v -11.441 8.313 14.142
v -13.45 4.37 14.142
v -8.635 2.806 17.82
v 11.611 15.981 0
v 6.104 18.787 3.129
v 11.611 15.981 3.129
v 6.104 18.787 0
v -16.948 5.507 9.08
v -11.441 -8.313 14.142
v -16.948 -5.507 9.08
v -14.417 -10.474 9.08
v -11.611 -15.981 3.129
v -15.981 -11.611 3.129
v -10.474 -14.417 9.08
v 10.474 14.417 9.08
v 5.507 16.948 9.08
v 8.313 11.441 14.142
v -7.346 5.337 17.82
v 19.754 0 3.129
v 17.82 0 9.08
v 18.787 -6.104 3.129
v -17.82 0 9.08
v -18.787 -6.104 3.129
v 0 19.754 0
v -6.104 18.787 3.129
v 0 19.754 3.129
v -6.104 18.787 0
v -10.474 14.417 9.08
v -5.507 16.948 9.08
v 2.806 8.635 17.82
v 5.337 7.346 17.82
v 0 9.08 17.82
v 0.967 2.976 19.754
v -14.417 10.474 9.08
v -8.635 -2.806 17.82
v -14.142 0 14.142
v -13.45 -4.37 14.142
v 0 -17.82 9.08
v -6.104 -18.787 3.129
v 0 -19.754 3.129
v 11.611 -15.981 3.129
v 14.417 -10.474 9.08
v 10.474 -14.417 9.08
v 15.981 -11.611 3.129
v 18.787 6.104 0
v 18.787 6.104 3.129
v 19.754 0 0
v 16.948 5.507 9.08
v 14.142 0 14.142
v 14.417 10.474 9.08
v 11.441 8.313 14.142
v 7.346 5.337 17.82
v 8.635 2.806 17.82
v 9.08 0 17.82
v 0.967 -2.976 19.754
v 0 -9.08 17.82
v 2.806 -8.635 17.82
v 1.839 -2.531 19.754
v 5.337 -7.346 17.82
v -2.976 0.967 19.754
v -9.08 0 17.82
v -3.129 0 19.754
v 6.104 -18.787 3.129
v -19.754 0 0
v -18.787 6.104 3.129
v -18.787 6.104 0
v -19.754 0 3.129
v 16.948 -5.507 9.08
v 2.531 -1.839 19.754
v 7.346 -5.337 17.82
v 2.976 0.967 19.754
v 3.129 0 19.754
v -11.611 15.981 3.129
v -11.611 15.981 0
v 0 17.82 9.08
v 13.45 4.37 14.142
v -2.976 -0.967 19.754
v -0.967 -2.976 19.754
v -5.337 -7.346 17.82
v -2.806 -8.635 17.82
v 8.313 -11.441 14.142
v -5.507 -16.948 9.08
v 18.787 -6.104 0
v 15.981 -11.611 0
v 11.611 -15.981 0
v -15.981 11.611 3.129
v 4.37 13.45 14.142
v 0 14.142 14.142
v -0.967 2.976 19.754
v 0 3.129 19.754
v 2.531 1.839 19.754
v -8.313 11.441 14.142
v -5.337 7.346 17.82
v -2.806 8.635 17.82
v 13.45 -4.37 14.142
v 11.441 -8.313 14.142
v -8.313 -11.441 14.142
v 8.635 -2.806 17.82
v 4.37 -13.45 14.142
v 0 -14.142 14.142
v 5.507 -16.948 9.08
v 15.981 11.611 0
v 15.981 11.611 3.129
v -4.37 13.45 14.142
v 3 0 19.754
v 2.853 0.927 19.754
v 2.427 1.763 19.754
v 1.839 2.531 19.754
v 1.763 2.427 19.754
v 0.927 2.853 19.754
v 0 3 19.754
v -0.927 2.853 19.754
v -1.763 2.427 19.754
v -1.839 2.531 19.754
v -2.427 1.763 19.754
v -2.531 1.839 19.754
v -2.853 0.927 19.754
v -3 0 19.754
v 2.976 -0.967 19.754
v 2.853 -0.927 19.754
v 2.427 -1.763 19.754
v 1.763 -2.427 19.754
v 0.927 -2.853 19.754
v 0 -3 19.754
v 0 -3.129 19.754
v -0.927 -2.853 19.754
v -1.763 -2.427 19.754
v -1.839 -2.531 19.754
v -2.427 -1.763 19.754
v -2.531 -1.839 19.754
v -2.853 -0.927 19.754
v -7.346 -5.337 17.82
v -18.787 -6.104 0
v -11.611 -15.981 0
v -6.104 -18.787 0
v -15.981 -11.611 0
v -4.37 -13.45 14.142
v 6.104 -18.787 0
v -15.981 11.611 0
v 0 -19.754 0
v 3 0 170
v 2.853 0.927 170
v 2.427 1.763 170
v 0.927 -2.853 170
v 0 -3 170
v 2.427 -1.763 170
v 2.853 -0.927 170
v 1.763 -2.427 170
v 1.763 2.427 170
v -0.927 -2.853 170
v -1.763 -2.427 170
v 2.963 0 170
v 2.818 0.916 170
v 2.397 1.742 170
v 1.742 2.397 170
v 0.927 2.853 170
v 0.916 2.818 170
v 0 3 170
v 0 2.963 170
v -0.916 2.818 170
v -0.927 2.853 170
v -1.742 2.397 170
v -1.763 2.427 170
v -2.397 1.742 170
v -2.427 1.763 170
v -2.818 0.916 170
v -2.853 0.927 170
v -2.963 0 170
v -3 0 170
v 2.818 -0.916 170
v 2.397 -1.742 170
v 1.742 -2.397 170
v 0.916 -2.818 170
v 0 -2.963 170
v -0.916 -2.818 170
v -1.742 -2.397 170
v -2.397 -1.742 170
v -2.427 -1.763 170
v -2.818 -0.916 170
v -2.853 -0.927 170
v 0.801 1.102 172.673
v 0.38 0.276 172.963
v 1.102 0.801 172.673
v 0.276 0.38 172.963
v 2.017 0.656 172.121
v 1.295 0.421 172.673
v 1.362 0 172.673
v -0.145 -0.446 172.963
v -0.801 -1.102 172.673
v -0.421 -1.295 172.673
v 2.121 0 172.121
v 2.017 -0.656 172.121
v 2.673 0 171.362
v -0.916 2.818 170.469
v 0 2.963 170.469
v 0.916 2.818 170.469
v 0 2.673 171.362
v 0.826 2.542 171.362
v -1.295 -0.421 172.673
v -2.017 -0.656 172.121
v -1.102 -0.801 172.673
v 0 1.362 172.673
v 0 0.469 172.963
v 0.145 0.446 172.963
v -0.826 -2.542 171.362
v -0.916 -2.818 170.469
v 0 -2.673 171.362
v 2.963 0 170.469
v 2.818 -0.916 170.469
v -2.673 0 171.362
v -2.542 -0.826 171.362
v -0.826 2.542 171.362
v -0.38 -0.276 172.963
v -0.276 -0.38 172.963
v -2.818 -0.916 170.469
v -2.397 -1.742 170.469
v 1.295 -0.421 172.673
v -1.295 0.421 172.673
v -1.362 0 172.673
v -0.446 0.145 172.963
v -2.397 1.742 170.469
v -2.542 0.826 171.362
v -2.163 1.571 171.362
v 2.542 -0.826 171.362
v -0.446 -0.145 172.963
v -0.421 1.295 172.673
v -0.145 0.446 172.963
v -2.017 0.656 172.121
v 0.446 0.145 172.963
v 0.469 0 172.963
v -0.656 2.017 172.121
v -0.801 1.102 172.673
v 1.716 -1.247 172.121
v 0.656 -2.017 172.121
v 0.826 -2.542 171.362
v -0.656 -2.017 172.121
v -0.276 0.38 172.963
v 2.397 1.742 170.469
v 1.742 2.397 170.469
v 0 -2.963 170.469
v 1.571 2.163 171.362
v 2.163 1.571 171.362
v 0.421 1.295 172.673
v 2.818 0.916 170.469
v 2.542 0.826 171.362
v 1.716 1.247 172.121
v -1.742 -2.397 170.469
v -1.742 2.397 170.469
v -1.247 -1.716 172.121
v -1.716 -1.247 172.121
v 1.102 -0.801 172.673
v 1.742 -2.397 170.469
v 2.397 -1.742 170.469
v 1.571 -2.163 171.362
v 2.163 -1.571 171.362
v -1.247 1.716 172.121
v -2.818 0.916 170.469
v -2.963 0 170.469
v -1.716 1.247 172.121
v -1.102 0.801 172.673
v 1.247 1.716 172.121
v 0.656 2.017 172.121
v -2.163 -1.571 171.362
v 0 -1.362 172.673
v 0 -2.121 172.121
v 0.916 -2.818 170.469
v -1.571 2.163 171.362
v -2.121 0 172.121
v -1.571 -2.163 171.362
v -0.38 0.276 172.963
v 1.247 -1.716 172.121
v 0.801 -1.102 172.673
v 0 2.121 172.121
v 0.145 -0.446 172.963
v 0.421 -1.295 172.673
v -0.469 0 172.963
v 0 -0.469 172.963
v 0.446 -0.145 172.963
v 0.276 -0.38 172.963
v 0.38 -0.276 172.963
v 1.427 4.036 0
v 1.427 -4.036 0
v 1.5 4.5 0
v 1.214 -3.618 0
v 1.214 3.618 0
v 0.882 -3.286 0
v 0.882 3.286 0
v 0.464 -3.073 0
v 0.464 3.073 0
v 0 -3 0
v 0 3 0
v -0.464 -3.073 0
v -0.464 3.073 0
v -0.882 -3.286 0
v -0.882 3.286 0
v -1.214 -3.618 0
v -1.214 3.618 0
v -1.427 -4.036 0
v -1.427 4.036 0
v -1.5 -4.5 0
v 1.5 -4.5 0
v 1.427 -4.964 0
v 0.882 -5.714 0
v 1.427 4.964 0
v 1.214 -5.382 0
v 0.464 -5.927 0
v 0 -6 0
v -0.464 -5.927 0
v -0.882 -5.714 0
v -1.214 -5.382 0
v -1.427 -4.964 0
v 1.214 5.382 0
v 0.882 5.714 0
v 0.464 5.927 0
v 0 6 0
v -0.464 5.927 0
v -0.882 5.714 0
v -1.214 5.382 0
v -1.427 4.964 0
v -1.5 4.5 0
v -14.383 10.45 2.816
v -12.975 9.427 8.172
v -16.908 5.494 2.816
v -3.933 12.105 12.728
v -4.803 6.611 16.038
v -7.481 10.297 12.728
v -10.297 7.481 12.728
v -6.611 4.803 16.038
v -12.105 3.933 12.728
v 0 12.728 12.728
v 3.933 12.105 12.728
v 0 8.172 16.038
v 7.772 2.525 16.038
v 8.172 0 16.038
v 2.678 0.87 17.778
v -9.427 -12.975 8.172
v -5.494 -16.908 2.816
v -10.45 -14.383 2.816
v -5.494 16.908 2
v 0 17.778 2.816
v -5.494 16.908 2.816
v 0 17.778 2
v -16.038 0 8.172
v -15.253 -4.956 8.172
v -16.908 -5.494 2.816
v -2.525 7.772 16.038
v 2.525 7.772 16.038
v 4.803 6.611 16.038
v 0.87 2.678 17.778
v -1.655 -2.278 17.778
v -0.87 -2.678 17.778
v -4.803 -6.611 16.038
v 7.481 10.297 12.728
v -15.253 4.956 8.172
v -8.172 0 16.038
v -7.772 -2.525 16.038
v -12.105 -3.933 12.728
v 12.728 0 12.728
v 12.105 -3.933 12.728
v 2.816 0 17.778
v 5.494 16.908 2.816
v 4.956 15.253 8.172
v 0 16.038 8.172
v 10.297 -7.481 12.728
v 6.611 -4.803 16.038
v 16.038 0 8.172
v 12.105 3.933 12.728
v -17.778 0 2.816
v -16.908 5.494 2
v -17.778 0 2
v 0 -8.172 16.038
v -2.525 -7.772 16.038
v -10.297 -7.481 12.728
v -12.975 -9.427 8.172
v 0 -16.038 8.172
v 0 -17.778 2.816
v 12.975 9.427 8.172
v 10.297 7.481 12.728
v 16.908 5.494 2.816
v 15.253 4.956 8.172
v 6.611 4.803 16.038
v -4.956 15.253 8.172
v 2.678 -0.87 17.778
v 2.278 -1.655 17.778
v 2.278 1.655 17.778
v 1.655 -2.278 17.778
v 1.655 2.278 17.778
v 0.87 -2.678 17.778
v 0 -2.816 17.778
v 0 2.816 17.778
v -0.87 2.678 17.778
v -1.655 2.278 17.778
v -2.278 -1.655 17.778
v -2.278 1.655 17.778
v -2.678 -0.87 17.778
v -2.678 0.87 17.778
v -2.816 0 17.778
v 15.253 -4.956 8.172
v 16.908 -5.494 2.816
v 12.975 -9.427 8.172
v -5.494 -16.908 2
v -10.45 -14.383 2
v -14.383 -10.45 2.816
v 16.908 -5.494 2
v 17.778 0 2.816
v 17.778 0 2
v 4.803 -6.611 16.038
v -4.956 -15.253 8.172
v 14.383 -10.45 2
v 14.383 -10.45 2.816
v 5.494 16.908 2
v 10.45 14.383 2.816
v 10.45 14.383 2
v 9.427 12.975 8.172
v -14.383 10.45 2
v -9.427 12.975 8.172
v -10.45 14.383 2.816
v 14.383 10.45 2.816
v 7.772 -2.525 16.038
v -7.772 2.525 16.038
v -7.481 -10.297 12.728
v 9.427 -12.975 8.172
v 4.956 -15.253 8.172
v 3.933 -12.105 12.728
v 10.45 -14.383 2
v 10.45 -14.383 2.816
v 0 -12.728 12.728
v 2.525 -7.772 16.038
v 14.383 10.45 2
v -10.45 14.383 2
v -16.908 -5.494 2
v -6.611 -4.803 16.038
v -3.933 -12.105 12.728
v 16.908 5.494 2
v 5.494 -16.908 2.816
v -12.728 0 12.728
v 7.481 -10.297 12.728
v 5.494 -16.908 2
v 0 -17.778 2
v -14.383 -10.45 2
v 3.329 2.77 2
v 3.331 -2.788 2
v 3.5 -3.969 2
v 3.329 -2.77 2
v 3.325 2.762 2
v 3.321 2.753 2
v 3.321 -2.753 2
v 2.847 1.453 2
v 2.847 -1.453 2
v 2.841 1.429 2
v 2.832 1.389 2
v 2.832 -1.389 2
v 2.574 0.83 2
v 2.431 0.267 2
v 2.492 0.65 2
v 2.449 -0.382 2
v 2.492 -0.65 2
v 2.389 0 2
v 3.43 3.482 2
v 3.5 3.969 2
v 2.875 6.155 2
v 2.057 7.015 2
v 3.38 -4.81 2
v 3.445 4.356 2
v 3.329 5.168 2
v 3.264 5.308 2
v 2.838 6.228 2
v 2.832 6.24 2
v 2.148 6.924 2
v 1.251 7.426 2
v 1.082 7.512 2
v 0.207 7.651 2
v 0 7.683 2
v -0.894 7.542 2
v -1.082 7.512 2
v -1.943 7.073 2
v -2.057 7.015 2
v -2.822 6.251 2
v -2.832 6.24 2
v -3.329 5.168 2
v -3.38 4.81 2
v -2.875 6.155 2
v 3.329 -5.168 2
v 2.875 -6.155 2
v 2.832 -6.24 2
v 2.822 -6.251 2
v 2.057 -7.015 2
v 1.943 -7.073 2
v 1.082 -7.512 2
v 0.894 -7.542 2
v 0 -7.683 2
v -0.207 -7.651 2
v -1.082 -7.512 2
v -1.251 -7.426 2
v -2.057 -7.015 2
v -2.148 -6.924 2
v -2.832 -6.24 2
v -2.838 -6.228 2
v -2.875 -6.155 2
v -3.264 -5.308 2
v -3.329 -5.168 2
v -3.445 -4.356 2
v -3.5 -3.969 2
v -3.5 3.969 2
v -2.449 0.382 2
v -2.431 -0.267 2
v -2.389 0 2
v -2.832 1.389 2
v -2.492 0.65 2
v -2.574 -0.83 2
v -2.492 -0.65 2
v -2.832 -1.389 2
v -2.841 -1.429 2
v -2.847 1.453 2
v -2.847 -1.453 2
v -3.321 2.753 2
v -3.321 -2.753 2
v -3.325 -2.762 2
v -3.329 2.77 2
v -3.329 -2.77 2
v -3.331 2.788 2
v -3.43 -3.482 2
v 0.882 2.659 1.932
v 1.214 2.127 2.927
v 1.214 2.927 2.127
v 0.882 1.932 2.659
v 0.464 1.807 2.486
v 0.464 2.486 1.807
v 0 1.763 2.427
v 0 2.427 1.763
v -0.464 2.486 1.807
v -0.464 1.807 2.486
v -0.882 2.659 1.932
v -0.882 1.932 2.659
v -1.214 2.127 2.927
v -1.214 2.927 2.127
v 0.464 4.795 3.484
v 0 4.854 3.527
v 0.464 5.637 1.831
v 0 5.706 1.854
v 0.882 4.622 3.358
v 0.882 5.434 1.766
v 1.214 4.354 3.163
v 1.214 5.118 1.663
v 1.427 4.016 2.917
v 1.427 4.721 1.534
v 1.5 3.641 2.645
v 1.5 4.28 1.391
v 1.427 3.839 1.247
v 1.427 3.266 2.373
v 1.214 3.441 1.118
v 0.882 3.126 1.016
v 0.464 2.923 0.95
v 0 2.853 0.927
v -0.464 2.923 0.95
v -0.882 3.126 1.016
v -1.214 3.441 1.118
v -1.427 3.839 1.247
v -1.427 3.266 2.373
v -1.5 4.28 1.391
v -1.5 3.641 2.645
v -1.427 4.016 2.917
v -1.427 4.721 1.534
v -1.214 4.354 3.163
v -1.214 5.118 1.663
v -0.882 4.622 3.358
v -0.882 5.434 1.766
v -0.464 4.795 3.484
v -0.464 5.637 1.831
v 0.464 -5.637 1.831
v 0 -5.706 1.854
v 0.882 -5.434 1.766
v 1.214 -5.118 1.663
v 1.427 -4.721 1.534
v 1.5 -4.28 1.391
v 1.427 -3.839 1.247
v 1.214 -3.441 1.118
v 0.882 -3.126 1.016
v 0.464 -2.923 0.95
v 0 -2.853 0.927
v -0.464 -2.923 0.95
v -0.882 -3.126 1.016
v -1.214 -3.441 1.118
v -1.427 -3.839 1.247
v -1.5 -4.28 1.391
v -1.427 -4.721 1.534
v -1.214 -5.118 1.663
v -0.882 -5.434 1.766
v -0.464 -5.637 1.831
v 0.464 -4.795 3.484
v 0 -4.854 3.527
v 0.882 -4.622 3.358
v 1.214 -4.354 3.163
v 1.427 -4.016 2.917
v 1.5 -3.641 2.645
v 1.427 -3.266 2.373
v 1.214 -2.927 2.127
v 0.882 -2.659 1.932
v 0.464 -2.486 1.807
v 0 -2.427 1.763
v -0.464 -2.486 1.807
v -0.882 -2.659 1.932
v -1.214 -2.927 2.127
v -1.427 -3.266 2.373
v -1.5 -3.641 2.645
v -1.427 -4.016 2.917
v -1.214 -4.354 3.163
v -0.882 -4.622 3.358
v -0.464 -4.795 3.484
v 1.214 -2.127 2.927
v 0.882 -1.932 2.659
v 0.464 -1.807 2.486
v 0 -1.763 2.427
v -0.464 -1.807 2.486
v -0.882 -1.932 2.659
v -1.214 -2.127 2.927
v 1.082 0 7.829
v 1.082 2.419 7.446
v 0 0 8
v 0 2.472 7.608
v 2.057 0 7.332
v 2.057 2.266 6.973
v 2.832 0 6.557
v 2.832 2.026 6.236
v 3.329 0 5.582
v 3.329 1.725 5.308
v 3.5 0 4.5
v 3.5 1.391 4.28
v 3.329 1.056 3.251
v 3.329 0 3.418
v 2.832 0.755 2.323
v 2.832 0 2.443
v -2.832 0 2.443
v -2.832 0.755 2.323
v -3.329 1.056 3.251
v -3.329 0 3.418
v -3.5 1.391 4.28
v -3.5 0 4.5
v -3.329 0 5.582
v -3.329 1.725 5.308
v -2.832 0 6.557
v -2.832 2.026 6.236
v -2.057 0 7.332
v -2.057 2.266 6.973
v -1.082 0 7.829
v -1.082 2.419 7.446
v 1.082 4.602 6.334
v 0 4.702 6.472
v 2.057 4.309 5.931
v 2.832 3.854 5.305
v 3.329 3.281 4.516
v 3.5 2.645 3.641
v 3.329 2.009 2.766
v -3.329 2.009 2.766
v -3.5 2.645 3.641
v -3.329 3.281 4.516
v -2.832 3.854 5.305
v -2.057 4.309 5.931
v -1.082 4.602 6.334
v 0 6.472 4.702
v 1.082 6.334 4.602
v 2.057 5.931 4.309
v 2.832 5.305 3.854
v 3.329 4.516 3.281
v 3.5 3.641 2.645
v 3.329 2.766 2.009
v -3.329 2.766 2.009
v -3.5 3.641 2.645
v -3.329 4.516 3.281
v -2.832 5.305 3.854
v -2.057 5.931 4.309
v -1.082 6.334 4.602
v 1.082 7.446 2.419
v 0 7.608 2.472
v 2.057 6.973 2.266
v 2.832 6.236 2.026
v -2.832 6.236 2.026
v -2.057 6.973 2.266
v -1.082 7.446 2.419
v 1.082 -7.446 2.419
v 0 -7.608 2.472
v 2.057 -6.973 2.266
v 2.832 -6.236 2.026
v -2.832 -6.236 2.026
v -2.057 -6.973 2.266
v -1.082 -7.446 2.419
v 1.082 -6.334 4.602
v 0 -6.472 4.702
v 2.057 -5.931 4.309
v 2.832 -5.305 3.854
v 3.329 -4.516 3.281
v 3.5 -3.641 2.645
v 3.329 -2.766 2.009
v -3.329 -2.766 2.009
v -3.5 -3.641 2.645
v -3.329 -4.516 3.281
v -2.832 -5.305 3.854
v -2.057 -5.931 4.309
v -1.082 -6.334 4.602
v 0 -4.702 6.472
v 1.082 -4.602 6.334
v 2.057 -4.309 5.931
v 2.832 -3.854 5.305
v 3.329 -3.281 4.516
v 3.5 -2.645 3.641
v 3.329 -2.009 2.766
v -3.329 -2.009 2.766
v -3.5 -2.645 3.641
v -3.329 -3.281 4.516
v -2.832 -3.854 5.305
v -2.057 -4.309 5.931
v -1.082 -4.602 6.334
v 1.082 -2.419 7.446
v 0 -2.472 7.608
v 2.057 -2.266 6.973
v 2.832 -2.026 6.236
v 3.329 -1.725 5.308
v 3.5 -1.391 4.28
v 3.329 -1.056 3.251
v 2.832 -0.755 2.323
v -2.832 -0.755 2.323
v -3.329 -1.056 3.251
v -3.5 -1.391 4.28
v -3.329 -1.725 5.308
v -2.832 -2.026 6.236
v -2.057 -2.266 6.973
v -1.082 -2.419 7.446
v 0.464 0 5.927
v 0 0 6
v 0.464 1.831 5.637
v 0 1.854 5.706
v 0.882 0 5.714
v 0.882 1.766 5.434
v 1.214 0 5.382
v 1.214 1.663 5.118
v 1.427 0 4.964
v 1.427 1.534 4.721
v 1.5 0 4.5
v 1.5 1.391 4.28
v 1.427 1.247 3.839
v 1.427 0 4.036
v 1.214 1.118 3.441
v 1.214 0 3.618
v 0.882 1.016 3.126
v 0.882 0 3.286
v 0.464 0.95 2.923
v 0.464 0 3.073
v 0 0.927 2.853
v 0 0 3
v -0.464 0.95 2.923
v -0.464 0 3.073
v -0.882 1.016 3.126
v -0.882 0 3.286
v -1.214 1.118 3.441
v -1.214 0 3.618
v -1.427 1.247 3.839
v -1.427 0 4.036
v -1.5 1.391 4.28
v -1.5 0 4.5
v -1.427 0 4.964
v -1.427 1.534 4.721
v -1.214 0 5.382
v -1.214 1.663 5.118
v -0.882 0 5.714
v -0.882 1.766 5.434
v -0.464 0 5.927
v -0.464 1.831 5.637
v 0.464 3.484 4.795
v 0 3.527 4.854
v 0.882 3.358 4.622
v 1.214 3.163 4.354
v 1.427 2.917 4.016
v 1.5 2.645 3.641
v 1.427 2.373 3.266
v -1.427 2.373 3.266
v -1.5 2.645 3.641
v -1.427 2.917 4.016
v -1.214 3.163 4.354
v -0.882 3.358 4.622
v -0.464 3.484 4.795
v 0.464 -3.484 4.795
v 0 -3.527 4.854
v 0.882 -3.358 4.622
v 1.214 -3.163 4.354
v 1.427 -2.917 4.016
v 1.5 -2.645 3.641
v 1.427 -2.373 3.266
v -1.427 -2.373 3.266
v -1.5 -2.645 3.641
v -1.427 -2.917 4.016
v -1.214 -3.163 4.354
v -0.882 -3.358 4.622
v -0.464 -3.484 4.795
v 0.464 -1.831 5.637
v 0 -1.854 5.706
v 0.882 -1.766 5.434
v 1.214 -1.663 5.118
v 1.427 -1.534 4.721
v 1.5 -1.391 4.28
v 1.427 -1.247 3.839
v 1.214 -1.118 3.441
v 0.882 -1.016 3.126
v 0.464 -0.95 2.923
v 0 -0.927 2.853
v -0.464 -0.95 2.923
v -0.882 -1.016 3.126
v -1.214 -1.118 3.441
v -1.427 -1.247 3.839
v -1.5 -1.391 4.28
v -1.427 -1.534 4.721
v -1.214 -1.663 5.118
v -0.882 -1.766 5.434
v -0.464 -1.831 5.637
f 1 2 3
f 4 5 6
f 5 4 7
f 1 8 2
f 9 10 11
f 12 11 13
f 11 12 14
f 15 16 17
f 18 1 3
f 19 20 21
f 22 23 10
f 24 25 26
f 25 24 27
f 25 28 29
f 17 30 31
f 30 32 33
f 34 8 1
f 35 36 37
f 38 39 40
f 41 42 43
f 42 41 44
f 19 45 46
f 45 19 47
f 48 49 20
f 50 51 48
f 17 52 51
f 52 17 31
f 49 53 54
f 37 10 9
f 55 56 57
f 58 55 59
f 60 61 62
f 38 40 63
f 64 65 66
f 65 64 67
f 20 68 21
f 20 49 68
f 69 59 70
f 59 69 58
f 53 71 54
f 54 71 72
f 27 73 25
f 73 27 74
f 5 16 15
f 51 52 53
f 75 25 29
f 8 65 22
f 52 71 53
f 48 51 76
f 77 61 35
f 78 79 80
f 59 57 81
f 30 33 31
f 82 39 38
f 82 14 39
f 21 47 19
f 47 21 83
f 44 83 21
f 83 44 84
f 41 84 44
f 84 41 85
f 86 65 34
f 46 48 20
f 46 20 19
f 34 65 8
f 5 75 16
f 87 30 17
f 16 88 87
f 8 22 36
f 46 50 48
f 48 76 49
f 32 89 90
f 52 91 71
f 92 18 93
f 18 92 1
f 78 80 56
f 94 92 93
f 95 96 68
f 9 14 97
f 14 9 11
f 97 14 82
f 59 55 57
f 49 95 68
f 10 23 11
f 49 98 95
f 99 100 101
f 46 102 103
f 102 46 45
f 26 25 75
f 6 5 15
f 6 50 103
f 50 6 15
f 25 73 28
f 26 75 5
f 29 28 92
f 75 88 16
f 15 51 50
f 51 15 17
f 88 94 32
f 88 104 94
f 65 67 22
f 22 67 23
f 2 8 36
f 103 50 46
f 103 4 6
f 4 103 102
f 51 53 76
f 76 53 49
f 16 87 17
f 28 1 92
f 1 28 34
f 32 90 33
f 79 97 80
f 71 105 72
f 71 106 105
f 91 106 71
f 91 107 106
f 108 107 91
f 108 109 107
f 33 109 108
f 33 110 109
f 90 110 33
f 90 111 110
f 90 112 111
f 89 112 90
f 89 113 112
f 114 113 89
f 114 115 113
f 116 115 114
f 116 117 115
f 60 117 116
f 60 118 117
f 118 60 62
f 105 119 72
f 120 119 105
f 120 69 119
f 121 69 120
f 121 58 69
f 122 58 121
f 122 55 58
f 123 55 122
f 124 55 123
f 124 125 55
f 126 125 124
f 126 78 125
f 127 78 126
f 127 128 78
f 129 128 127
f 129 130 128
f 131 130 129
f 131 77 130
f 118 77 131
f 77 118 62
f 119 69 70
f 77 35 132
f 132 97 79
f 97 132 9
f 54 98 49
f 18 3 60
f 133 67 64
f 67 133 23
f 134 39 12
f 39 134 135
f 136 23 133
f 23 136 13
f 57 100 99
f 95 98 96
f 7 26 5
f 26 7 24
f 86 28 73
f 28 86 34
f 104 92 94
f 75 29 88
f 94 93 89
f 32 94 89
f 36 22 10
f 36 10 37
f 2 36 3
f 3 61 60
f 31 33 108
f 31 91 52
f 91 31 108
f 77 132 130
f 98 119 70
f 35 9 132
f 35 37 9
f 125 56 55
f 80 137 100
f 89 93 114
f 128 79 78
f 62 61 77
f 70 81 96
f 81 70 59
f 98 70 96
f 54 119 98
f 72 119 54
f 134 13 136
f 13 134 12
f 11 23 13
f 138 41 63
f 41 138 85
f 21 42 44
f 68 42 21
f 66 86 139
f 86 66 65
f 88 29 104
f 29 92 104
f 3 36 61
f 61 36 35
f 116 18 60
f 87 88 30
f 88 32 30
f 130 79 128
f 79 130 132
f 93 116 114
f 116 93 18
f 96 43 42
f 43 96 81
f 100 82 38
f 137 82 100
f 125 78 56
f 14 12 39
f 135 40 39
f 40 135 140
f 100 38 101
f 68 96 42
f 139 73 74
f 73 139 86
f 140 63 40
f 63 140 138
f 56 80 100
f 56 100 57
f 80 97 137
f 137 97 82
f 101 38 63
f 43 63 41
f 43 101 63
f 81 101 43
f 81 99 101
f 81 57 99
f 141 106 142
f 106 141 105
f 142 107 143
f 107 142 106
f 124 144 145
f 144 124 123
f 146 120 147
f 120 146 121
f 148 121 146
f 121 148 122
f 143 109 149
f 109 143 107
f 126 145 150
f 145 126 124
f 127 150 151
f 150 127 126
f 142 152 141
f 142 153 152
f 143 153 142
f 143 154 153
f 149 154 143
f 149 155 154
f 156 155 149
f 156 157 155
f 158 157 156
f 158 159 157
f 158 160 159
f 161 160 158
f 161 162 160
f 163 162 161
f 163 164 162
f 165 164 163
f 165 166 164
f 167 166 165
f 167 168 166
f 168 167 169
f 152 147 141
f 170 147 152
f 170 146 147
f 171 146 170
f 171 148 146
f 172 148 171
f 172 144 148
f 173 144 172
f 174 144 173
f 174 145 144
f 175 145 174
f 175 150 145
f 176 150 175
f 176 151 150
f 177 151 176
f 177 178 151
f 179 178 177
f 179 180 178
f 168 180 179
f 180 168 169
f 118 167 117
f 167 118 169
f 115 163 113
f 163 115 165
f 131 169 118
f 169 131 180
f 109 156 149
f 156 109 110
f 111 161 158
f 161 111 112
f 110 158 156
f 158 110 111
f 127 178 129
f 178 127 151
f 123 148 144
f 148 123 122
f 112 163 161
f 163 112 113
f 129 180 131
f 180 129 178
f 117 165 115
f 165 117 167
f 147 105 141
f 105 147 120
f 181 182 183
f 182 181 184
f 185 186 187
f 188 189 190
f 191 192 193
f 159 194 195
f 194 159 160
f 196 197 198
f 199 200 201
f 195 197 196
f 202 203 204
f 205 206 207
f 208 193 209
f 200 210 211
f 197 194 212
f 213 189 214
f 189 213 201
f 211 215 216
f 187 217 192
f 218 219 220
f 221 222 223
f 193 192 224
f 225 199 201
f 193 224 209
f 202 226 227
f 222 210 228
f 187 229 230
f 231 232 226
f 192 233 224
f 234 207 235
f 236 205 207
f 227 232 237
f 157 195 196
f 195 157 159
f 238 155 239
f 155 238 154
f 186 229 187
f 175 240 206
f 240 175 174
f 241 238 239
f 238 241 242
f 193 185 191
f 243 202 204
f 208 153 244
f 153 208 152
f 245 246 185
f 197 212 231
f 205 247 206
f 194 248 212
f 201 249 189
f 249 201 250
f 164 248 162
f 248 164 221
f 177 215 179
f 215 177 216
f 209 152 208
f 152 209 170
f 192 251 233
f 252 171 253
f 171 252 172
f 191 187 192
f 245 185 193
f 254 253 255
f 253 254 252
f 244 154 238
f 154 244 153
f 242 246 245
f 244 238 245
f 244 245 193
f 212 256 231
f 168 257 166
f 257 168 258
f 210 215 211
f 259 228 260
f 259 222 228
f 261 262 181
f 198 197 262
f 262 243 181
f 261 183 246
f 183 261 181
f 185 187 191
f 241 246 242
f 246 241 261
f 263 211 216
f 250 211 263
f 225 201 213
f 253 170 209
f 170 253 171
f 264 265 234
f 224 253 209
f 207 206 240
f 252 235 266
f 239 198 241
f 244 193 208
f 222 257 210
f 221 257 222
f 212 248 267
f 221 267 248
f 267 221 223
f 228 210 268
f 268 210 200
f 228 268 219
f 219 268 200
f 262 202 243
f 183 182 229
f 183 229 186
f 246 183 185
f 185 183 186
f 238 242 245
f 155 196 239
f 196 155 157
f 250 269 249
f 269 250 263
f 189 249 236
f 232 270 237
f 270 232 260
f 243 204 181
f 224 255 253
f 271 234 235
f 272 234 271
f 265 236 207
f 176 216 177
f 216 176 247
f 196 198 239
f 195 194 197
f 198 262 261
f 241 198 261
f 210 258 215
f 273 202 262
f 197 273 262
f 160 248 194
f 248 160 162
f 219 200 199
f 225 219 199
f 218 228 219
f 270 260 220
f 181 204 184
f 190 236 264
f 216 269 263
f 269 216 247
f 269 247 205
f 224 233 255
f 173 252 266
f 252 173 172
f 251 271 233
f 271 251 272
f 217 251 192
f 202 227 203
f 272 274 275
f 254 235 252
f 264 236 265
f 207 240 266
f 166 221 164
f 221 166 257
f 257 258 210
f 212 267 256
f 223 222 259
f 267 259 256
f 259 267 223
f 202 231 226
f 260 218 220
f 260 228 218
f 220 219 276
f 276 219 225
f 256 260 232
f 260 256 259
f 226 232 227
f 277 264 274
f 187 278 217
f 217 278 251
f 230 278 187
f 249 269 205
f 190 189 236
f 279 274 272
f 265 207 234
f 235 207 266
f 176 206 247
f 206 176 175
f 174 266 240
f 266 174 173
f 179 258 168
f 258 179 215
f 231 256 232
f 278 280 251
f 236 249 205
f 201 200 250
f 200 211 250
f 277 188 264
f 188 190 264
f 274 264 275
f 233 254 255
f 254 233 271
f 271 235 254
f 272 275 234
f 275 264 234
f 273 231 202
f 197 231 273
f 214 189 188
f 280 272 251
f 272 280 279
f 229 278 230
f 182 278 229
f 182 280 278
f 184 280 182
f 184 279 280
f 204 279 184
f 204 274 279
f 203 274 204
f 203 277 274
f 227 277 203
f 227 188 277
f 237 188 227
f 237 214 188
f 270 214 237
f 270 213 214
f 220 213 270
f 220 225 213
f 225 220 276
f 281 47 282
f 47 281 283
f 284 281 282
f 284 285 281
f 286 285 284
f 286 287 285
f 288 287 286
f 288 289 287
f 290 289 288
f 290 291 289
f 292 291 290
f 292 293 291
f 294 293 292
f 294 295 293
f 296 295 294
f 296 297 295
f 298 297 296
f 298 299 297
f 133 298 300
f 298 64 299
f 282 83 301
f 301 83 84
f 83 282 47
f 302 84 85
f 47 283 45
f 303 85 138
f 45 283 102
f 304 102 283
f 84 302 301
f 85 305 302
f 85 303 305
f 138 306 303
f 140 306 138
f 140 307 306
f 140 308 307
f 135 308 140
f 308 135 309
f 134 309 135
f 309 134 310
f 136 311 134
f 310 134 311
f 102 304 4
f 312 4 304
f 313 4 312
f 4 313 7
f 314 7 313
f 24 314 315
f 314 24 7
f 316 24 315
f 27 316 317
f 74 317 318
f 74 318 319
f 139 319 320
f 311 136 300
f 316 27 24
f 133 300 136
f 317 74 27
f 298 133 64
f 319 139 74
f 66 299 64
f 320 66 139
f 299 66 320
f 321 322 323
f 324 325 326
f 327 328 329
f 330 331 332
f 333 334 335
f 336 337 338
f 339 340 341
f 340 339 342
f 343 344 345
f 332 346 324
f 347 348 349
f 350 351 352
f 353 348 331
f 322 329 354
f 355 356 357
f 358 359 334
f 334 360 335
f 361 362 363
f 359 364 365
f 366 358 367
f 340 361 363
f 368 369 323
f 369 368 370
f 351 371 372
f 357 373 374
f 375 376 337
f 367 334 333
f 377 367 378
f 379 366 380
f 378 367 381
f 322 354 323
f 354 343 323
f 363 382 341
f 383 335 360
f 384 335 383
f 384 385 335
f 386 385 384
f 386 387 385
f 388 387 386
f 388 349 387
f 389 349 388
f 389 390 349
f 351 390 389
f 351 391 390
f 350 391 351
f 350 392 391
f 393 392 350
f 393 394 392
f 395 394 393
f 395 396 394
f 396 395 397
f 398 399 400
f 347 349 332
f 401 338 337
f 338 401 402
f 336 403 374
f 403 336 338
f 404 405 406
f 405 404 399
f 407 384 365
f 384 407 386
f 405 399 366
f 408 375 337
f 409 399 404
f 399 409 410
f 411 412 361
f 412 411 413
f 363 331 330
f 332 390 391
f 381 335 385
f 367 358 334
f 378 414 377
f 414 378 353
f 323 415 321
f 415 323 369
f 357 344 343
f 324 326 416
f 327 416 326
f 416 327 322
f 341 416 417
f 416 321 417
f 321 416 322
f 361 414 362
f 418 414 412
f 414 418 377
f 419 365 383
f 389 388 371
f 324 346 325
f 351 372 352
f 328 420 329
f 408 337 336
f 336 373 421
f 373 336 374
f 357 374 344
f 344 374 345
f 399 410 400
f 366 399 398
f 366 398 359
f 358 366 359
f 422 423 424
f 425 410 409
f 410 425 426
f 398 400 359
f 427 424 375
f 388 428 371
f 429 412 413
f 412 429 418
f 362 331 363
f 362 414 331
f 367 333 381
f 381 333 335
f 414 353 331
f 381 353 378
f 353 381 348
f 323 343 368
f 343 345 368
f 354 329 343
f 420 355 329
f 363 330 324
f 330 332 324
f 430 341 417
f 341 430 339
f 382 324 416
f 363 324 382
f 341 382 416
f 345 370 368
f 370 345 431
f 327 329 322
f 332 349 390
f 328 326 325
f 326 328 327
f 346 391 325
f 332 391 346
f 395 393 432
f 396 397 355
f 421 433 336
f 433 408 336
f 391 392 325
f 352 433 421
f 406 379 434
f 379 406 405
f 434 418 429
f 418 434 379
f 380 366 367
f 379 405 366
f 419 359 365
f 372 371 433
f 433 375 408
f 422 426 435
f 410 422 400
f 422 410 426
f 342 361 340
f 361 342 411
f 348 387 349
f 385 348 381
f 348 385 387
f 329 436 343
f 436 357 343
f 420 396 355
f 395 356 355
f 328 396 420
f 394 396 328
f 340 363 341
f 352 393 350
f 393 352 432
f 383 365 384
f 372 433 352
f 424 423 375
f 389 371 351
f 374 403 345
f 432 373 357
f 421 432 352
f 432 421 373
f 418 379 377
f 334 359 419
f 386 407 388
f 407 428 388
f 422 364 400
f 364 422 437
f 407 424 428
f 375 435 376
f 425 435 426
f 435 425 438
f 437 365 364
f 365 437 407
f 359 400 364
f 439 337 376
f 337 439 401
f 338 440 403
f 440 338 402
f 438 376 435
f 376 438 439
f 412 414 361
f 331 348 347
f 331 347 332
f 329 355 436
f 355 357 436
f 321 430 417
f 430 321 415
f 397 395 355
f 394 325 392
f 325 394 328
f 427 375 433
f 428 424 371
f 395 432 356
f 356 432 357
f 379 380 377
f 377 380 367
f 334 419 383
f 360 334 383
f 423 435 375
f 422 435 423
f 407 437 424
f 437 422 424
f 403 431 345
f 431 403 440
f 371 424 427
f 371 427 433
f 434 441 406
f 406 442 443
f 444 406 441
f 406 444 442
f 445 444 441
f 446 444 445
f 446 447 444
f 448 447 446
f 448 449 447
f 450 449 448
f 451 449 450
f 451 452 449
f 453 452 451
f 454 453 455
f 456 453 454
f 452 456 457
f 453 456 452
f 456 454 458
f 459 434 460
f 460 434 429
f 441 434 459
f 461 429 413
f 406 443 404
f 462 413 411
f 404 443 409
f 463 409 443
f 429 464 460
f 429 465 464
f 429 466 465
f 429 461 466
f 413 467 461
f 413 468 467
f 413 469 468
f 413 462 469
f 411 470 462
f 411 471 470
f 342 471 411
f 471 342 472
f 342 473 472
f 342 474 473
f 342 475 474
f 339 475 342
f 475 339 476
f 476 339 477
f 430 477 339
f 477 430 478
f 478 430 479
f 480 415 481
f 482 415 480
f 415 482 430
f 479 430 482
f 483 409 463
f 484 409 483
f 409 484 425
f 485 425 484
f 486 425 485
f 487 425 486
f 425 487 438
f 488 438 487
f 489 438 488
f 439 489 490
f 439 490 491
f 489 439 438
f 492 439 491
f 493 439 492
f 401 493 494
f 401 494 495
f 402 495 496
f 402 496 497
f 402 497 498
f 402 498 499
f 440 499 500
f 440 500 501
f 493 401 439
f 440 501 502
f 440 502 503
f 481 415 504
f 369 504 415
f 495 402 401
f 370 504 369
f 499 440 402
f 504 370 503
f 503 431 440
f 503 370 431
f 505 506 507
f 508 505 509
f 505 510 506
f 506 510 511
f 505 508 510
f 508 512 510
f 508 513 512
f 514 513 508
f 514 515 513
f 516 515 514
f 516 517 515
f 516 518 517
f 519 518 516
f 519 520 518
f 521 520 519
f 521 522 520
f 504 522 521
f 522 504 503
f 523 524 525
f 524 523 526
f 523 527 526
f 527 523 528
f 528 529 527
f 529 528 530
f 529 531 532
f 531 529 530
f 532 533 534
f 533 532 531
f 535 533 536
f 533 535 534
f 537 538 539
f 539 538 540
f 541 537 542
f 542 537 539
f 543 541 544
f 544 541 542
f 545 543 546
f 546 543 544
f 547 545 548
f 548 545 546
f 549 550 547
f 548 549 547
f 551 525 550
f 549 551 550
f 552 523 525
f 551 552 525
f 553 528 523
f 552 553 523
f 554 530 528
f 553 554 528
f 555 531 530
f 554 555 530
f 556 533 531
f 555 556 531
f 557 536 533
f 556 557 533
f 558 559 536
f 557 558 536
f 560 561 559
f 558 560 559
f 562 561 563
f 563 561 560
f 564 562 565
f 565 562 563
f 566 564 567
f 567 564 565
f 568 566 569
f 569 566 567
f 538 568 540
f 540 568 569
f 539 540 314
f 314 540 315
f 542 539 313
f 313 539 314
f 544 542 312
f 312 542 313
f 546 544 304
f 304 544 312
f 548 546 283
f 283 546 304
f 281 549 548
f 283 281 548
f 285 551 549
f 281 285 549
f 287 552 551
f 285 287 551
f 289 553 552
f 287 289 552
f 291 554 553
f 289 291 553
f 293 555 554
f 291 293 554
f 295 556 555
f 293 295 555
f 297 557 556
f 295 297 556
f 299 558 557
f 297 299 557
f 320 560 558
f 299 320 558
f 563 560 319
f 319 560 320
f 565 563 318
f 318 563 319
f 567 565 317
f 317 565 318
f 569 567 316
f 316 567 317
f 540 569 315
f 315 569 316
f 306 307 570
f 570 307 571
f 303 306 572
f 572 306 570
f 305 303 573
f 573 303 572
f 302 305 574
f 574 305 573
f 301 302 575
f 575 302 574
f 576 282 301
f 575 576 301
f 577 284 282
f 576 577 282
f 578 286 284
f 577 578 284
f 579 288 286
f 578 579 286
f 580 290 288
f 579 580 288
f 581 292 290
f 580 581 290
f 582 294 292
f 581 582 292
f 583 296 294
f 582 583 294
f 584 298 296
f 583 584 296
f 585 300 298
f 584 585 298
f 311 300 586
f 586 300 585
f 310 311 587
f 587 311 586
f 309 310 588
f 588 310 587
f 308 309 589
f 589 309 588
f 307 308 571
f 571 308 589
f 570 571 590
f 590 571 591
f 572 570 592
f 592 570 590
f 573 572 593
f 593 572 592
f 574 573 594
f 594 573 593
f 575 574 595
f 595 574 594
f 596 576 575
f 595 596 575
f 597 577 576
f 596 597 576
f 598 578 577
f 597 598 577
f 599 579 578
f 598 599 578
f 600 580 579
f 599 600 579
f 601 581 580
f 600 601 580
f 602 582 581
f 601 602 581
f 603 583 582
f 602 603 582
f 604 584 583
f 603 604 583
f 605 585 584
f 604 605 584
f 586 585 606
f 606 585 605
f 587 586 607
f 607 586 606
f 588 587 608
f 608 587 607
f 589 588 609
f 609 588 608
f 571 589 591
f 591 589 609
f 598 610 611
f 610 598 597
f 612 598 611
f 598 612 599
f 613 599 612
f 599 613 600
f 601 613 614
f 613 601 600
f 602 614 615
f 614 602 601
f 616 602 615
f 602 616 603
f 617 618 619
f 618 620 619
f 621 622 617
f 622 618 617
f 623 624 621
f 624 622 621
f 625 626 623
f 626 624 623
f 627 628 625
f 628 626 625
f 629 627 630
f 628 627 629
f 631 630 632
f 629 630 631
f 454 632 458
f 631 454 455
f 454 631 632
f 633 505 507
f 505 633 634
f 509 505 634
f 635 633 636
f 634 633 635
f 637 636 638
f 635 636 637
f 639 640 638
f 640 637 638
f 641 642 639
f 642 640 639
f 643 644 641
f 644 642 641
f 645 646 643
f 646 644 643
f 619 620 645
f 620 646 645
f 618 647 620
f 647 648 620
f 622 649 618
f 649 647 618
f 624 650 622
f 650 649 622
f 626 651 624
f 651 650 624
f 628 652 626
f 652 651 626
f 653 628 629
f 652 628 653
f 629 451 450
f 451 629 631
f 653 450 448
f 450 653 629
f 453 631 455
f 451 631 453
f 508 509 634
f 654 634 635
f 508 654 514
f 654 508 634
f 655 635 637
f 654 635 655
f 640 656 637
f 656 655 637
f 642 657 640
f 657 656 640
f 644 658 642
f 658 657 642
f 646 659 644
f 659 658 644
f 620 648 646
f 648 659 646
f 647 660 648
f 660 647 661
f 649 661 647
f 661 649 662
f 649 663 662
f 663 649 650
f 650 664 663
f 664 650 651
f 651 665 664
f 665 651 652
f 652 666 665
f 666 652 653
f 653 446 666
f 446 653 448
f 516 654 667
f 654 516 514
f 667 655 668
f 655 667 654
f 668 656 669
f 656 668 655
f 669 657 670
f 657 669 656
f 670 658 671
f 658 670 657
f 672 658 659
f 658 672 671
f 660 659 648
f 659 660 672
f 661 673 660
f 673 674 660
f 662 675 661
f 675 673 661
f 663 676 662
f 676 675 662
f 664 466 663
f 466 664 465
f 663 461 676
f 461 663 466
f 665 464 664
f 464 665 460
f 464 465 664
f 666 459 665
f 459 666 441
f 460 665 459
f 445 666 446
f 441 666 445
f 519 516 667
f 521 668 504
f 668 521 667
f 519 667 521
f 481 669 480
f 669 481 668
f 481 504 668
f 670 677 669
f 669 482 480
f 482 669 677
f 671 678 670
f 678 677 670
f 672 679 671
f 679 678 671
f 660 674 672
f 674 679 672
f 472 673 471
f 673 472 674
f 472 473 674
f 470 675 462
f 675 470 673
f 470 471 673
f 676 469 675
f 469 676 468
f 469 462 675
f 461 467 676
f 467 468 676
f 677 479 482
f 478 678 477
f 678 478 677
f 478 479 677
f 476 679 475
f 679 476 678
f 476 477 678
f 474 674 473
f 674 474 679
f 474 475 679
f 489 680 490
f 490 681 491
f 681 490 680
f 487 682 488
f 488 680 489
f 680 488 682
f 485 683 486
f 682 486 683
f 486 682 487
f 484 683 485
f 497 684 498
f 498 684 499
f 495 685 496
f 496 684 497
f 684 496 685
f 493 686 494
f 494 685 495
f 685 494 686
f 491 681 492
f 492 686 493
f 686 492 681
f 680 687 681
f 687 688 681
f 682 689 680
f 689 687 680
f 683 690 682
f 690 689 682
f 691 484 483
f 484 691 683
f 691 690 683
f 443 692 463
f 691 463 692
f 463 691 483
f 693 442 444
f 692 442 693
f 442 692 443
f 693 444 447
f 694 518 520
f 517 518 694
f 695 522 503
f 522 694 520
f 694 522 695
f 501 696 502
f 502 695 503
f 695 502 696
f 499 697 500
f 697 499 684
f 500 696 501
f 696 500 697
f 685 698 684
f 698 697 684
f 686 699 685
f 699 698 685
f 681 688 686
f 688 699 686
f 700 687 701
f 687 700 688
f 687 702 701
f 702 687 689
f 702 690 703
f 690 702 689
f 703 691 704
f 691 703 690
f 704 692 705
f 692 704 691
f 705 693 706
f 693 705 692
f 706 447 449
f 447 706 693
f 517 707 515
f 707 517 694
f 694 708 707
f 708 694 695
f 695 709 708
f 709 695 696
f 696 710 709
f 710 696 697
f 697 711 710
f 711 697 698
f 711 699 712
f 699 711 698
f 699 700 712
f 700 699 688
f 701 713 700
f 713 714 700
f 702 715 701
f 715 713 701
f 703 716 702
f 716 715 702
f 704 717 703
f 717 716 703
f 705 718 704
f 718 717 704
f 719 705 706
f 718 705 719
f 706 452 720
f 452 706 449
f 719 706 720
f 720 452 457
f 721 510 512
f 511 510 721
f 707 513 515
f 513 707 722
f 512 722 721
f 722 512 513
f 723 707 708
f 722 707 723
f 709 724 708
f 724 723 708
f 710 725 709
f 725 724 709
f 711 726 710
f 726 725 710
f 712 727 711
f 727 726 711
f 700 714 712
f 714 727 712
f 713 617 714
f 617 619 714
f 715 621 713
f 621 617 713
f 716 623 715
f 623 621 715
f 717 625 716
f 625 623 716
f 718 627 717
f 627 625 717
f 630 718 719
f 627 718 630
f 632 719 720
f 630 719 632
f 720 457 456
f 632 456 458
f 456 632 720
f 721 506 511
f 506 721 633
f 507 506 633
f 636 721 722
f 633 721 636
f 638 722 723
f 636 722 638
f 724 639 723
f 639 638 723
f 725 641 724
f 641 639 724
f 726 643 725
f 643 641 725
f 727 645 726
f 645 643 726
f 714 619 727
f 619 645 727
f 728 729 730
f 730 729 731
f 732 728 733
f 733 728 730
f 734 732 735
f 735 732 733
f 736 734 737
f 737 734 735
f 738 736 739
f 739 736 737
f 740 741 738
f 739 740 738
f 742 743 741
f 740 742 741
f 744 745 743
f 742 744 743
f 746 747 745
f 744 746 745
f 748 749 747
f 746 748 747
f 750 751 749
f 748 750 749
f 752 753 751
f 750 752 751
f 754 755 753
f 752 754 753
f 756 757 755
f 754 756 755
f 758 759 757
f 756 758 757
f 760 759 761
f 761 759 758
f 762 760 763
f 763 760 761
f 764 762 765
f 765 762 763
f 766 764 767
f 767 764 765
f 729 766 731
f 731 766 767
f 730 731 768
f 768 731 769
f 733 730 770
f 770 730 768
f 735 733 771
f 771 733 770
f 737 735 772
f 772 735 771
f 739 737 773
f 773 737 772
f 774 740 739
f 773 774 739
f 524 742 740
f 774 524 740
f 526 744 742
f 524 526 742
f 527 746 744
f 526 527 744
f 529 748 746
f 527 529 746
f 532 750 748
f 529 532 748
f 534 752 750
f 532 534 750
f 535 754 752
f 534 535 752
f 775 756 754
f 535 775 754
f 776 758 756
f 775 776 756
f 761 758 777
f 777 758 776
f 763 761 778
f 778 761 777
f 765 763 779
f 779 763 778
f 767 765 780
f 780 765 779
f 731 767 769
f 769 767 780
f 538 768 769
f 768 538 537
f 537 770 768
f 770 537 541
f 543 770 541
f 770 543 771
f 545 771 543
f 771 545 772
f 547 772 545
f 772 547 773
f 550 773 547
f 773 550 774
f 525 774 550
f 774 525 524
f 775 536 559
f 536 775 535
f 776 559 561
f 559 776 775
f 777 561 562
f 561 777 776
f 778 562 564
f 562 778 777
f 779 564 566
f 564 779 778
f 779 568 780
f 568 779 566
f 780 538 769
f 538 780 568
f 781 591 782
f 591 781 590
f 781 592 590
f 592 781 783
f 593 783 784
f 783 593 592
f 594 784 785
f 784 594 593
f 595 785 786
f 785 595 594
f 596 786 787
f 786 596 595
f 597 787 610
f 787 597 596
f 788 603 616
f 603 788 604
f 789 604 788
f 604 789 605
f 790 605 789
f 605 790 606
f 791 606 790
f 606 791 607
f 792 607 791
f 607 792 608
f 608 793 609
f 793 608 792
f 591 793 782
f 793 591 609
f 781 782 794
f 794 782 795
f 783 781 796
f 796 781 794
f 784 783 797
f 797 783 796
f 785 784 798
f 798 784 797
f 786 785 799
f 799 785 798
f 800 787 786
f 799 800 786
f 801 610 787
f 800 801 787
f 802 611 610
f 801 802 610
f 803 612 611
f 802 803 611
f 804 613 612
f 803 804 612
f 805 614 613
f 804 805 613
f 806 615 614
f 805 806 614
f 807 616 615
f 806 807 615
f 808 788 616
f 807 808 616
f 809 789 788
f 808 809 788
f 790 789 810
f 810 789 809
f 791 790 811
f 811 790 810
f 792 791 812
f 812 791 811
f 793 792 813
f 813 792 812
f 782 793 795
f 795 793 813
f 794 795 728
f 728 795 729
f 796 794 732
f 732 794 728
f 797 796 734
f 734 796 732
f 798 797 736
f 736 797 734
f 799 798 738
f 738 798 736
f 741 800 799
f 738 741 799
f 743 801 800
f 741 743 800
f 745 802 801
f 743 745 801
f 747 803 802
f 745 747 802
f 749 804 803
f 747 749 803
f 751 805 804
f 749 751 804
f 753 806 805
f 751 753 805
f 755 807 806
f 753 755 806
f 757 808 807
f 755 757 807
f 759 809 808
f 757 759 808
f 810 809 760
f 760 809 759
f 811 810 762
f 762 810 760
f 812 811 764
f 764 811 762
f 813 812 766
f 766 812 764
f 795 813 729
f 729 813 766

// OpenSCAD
r = 20;
s = 2;
$fn =20;

hole_radius = 1.5;

rod_radius = 3.0;
rod_height = 150;

 difference() {
    union(){
            sphere(r);
             cylinder(rod_height+r,rod_radius,rod_radius);
             translate([0,0,rod_height+r]) sphere(rod_radius);

    }
    translate([-r,-r,-r])cube([1000,1000,r]);
    sphere(r-s);
}

difference(){
intersection(){cylinder(s,r,r);sphere(r);}
   rotate([0,90,0])rotate_extrude()translate([hole_radius*3,0,0])circle(hole_radius);
}
//make the line hole
difference(){
   rotate([0,90,0])rotate_extrude()translate([hole_radius*3,0,0])circle(hole_radius+s);
   rotate([0,90,0])rotate_extrude()translate([hole_radius*3,0,0])circle(hole_radius);
   translate([-r,-r,-r])cube([1000,1000,r]);

    }
//calculate needed weight
v =0.5* 3.1415*(4/3)*pow(r/10,3);
echo("NECCECARY WEIGHT",v);
//f = m*a
